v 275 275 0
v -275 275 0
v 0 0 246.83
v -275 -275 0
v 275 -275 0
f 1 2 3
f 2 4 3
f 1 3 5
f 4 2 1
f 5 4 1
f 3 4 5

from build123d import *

# Parameters (mm, degrees)
F0_W     = 550
F0_H     = 550
F1_DEPTH = 246.83
F2_SIZE2 = 246.82999
F2_SIZE  = 274.99999
F4_DEPTH = 275


# Not quite as in the source:
# - a fillet or chamfer is up to 0.001 mm smaller than in the source, because OpenCascade refuses the exact size


with BuildPart() as f1:
    # F0 (on Top) → F1 (new body)
    with BuildSketch(Plane.XY):
        Rectangle(F0_W, F0_H)
    extrude(amount=F1_DEPTH)

    # F2 (size 275 and 246.83 in the source; OpenCascade refuses exactly that, so slightly less here)
    f2_edges = [f1.edges().sort_by_distance(p)[0] for p in [
        (0, -275, 246.83),
        (0, 275, 246.83),
    ]]
    f2_side = f1.faces().sort_by_distance((0, 0, 246.83))[0]
    chamfer(f2_edges, length=F2_SIZE, length2=F2_SIZE2, reference=f2_side)

    # F3 (on Front) → F4 (cut, symmetric)
    with BuildSketch(Plane.XZ):
        Polygon((-275, 246.83), (-275, 0), (0, 246.83), align=None)
        Polygon((275, 246.83), (0, 246.83), (275, 0), align=None)
    extrude(amount=F4_DEPTH, both=True, mode=Mode.SUBTRACT)


solid = f1.part
